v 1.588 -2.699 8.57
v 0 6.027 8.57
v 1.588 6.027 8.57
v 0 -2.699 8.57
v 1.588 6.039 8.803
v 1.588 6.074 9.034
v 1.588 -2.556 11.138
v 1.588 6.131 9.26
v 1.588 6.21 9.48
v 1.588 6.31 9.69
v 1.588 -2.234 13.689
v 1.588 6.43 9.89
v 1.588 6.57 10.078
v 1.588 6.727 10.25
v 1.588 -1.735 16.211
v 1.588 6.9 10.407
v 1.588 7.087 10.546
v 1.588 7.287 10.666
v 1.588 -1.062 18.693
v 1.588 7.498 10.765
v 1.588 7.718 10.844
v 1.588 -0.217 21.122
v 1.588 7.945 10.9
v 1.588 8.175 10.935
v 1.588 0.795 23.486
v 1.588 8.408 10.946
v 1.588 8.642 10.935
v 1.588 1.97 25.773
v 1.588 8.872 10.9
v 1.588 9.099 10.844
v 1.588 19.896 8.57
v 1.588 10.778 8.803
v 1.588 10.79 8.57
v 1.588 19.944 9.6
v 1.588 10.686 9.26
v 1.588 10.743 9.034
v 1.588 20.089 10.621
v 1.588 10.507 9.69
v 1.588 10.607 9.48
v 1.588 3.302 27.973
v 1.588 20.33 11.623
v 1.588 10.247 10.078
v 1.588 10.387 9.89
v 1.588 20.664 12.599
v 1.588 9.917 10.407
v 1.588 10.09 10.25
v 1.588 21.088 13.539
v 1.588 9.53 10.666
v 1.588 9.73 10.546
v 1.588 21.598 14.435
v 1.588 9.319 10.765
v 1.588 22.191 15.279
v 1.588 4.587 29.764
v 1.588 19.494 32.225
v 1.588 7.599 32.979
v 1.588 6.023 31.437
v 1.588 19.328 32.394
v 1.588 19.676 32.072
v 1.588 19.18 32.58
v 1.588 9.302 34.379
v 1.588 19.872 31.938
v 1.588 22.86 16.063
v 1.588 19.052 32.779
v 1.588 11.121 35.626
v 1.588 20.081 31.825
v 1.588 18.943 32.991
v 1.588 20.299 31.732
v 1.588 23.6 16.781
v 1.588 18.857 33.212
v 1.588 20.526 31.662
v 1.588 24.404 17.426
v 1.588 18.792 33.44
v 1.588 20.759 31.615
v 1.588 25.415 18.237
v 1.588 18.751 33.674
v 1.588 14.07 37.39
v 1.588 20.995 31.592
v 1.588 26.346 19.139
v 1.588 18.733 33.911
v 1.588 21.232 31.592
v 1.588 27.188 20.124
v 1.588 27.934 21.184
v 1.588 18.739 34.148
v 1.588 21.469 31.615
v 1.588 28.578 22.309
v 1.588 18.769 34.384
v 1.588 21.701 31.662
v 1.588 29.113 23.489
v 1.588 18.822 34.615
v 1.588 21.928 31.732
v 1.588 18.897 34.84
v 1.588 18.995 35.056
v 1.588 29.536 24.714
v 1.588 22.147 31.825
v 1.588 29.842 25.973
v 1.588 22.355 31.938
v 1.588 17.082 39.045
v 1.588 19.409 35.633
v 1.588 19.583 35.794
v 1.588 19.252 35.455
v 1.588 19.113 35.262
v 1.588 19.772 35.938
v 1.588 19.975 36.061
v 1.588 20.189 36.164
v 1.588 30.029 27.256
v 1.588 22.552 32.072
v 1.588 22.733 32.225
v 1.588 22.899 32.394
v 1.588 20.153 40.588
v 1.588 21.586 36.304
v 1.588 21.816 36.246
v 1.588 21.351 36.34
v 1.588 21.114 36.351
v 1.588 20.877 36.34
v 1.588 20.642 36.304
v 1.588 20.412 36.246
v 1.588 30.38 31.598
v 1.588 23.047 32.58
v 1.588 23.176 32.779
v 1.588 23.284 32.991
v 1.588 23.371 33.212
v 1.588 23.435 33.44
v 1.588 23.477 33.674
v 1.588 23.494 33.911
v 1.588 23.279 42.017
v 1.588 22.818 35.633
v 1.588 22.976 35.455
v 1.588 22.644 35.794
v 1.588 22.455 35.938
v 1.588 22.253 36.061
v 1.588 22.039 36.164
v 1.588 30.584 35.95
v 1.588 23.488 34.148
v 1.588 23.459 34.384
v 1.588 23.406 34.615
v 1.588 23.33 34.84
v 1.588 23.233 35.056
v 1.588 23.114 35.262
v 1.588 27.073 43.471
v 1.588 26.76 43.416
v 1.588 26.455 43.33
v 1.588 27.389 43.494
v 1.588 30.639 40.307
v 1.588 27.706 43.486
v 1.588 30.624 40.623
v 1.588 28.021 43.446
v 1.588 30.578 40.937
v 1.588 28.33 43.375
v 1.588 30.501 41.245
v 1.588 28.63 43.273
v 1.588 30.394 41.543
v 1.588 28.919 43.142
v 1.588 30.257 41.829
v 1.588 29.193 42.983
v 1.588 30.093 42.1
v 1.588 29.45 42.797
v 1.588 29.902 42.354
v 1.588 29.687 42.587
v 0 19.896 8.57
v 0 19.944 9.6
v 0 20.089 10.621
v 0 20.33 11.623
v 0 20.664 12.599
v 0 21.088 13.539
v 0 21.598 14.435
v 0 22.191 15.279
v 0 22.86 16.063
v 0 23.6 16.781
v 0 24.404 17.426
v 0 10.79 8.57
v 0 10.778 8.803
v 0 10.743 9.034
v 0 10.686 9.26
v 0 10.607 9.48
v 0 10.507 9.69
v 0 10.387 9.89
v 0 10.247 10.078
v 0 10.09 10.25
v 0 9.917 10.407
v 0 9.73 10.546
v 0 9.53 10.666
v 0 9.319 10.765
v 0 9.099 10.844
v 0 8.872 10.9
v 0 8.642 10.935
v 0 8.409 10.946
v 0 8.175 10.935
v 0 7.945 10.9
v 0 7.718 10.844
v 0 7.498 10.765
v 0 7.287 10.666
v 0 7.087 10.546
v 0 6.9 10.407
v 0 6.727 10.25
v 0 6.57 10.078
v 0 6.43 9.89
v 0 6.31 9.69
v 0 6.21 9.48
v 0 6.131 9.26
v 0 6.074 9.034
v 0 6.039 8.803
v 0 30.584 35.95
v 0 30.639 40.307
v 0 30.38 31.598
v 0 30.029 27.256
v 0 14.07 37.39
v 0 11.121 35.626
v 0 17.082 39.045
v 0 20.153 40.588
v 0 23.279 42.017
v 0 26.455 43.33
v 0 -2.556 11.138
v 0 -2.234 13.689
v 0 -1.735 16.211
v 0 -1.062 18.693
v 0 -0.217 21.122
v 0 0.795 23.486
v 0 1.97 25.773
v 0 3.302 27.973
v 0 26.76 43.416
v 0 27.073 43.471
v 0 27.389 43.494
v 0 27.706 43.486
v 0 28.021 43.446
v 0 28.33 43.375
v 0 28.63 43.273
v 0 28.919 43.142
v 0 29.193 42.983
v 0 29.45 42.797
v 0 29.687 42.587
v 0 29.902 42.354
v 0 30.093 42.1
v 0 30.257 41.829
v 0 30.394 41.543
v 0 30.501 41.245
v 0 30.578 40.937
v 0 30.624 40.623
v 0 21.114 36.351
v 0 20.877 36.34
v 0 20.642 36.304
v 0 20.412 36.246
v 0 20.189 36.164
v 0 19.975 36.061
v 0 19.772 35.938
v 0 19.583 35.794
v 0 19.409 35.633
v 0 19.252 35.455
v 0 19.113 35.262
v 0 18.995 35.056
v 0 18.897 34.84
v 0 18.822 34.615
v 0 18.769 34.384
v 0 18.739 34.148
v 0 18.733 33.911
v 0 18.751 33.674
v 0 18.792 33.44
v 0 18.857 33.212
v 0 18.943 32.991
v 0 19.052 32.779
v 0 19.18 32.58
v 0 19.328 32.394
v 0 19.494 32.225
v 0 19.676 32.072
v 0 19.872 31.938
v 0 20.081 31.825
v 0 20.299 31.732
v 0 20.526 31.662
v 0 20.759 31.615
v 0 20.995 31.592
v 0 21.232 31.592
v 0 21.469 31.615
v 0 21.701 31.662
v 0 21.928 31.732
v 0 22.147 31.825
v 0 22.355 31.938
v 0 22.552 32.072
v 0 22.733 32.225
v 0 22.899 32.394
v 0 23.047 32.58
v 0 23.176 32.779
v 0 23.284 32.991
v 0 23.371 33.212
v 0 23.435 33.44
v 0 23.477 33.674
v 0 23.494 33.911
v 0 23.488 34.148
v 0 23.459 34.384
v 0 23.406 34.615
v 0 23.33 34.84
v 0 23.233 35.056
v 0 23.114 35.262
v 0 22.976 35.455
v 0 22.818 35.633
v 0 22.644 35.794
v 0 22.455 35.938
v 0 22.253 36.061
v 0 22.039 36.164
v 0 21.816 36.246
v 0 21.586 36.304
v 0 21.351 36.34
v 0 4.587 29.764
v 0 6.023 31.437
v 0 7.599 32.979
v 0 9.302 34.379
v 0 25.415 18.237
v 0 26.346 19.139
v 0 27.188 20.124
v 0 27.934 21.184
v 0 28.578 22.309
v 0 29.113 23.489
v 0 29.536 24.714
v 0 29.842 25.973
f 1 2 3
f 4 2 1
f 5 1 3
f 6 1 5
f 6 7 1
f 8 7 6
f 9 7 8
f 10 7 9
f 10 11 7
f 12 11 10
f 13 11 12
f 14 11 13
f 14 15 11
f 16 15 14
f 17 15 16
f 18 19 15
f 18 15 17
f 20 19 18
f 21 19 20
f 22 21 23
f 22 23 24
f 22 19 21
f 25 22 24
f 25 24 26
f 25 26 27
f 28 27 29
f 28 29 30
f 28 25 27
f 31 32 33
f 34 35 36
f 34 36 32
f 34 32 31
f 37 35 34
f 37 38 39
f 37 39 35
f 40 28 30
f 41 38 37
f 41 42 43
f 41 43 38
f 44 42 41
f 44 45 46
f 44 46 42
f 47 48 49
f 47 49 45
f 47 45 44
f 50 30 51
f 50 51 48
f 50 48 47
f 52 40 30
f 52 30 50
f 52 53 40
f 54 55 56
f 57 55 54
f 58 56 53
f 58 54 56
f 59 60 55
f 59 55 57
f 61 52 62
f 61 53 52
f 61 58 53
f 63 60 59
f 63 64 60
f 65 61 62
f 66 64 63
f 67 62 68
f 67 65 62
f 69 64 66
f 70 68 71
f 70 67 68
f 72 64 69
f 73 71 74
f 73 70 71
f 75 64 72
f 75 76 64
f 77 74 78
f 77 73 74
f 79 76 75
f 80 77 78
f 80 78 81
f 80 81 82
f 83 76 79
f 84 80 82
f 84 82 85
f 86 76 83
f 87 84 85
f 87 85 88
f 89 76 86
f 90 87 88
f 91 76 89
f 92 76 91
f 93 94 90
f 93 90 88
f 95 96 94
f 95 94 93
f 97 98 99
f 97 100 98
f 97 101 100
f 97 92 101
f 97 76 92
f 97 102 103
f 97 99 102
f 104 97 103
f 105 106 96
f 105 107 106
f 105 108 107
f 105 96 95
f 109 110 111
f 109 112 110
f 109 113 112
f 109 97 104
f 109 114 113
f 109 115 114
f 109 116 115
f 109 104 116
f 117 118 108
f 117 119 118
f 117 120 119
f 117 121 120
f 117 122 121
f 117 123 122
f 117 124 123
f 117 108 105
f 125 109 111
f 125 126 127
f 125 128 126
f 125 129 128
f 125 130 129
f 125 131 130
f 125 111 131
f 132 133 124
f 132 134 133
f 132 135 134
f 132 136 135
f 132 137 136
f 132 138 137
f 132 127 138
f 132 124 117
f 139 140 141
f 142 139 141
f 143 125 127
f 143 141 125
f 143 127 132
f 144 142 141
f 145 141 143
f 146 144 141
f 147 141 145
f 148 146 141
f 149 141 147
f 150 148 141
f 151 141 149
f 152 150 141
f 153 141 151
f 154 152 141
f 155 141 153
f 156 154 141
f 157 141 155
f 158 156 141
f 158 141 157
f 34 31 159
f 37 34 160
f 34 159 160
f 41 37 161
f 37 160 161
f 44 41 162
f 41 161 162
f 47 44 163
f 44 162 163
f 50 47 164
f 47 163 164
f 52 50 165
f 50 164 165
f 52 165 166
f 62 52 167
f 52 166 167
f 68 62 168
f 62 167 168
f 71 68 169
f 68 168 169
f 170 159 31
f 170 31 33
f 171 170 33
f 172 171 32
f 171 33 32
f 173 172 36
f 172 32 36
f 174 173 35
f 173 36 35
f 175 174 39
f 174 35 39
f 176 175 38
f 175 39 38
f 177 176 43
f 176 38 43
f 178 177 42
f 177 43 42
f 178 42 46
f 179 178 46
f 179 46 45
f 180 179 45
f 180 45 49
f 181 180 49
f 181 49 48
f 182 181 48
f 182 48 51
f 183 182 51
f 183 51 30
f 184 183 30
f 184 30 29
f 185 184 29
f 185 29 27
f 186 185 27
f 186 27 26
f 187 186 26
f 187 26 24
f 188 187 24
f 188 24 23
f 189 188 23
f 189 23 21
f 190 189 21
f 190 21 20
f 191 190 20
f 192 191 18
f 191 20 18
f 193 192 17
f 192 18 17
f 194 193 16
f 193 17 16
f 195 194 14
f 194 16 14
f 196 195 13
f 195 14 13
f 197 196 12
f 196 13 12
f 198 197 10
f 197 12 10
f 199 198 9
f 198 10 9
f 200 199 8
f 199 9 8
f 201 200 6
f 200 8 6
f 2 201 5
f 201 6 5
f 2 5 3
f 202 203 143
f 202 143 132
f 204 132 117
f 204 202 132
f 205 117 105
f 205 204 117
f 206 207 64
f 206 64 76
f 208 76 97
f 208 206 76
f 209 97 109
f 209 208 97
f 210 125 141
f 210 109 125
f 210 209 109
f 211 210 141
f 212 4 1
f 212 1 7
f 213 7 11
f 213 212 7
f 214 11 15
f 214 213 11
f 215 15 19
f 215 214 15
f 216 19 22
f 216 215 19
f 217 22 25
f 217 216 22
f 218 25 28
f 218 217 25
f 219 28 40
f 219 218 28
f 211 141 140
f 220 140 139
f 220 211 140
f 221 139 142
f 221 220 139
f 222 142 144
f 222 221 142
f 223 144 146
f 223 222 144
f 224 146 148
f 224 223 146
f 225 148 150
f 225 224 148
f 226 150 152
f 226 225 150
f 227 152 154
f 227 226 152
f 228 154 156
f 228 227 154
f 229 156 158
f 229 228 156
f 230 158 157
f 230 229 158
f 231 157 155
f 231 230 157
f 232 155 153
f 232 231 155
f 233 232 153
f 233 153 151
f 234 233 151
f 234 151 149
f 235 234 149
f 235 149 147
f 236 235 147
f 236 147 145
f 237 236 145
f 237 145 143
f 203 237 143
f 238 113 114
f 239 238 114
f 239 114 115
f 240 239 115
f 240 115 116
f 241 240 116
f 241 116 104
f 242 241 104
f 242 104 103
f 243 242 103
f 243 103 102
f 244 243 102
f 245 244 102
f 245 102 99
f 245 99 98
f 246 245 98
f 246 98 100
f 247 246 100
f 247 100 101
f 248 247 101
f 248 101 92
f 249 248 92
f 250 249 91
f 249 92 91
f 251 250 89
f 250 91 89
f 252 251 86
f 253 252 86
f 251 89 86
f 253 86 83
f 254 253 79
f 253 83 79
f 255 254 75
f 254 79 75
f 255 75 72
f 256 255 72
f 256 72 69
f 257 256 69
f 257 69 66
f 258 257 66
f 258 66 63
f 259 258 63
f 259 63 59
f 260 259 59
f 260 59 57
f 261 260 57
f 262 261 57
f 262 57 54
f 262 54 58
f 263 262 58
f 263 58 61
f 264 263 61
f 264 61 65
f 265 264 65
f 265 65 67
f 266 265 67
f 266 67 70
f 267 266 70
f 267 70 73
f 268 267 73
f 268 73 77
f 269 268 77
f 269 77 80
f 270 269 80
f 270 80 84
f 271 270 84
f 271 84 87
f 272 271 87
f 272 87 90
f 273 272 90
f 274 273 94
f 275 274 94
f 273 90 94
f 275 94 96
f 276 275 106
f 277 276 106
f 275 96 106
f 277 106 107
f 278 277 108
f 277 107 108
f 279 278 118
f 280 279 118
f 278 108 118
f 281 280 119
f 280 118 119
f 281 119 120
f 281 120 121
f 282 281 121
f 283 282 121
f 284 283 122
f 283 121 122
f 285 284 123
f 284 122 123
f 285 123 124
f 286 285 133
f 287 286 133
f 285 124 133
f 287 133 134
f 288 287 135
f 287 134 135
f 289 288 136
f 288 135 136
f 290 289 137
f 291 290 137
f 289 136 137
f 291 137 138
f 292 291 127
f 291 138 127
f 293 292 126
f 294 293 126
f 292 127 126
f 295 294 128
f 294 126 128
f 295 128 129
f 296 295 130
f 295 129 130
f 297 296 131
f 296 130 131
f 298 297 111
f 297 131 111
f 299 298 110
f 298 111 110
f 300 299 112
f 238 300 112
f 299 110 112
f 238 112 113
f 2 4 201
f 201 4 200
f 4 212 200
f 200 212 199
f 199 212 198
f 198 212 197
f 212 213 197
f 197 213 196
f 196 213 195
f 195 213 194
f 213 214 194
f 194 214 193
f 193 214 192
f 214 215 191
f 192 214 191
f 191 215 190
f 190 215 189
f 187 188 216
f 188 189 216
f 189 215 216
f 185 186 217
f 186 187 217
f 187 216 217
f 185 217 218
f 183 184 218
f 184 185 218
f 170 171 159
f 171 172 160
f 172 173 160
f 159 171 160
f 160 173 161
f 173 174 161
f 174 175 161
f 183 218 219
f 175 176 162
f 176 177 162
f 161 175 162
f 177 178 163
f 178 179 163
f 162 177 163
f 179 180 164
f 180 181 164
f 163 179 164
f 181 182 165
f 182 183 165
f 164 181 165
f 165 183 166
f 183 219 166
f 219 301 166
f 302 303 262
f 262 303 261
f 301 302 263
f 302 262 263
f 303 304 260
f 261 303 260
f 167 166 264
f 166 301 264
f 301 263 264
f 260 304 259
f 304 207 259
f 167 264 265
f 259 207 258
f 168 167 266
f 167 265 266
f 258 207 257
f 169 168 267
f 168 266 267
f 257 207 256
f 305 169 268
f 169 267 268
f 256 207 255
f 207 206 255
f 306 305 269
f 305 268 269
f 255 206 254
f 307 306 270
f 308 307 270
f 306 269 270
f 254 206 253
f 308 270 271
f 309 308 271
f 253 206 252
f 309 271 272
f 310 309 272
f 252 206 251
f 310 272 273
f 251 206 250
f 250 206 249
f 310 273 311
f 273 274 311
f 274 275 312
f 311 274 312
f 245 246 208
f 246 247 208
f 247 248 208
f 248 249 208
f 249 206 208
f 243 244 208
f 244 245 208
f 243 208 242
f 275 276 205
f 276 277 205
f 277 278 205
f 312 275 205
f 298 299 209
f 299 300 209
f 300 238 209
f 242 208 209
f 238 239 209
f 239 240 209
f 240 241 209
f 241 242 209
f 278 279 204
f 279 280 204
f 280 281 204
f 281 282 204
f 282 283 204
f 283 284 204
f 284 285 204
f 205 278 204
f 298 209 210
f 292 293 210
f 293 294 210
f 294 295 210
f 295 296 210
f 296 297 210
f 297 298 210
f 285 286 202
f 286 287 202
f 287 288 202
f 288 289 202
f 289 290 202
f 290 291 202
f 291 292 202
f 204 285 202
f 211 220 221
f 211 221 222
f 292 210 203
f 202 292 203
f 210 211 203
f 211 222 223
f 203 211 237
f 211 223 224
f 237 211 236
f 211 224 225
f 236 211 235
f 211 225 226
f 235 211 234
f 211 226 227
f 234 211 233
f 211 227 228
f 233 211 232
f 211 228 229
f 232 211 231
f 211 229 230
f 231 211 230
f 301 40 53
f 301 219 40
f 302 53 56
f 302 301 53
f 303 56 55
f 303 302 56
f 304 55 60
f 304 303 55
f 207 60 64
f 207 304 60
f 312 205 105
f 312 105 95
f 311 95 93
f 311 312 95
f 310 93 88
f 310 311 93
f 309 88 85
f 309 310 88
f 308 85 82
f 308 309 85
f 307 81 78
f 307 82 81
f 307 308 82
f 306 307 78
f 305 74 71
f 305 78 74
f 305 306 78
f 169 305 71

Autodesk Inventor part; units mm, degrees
ref_plane "YZ Plane" through (0, 0, 0) normal (1, 0, 0) x (0, 1, 0)
ref_plane "XZ Plane" through (0, 0, 0) normal (0, 1, 0) x (-1, 0, 0)
ref_plane "XY Plane" through (0, 0, 0) normal (0, 0, 1) x (1, 0, 0)
sketch "Sketch1" plane through (0, 6.2481, 6.7374) normal (1, 0, 0) x (0, 1, 0)
  line L0 (21.1383, 36.7567) -> (20.6141, 36.7567)
  arc A0 (24.3907, 33.5692) -> (18.0407, 33.5826) centre (21.2157, 33.5826) ccw
  arc A1 (14.8657, -15.4374) -> (16.4404, -11.3937) centre (-103.5619, 33.0092) ccw
  arc A2 (18.4214, -5.6206) -> (14.8657, -28.6257) centre (91.0657, -28.6257) ccw
  arc A3 (20.207, 36.5931) -> (4.8725, 28.8882) centre (54.3249, -50.4207) ccw
  arc A4 (18.4214, -5.6206) -> (24.3907, 33.5692) centre (-103.5619, 33.0092) ccw
  line L1 (14.8657, 1.8326) -> (14.8657, 27.2326)
  line L2 (14.8657, 1.8326) -> (14.8657, 33.5826)
  line L3 (-10.5343, 1.8326) -> (14.8657, 1.8326) construction
  line L4 (-10.5343, 1.8326) -> (-10.5343, 27.2326)
  line L5 (-10.5343, 1.8326) -> (-23.2343, 1.8326)
  line L6 (-10.5343, 1.8326) -> (-10.5395, -10.8674)
  line L7 (-10.5395, -10.8674) -> (2.1605, -10.8727)
  line L8 (21.2157, 33.5826) -> (19.8929, 33.5826)
  line L9 (14.8657, 33.5826) -> (21.2157, 33.5826)
  arc A5 (-6.7994, 20.2847) -> (-12.9991, 12.2415) centre (9.812, 1.0696) ccw
  line L10 (14.8657, 33.5826) -> (-10.5343, 33.5826)
  line L11 (2.1605, -10.8727) -> (2.1605, -17.9797)
  line L12 (2.1605, -17.9797) -> (10.4725, -17.9797)
  line L13 (2.1605, -17.9797) -> (-5.7795, -17.9797)
  line L14 (-8.9545, -14.8047) -> (-8.9545, 1.0703)
  line L15 (13.6475, -14.8047) -> (13.6475, 1.8326)
  arc A6 (-2.9466, 21.2359) -> (-8.9545, 1.0703) centre (27.8921, 1.0703) ccw
  arc A7 (4.8725, 28.8882) -> (-2.9466, 21.2359) centre (18.3119, 7.3349) ccw
  arc A8 (16.4403, 9.623) -> (23.7808, 20.5184) centre (10.0212, 21.8681) ccw
  arc A9 (18.1559, 10.6889) -> (13.6475, 1.8326) centre (24.6004, 1.8326) ccw
  arc A10 (10.4725, -17.9797) -> (13.6475, -14.8047) centre (10.4725, -14.8047) ccw
  arc A11 (-8.9545, -14.8047) -> (-5.7795, -17.9797) centre (-5.7795, -14.8047) ccw
  line L16 (2.1605, -10.8727) -> (2.1605, 1.8273)
  line L17 (13.6475, 1.8326) -> (-8.9467, 1.8326)
  point P0 (0, 0)
  point P1 (13.6475, -17.9797)
  point P2 (-8.9545, -17.9797)
  point P3 (-8.9545, -10.868)
  point P4 (19.8992, 36.4718)
  dimension "d9" = 25.4
  dimension "d7" = 12.7
  dimension "d11" = 6.35
  dimension "d12" = 6.35
  dimension "d8" = 31.75
  dimension "d10" = 25.4
  dimension "d5" = 25.4
  dimension "d6" = 12.7
  dimension "d4" = 25.4
  dimension "d3" = 19.05
  dimension "d2" = 25.4
  dimension "d1" = 3.175
  dimension "d0" = 12.7
extrude "Extrusion1" add sketch "Sketch1" along normal blind 1.5875 contours A4 A8 A9 L1 L2 L9 A0 A3 | A0 L9 L10 A3 | A9 L17 A6 A7 A3 L10 L2 L1
hole "Hole1" at (0, 21.1138, 33.9701) at (0, 8.4085, -4.1352) at (0, 8.4085, 8.5648) direction (1, 0, 0) diameter 4.7625 end through all
properties part number "sled-inner"
